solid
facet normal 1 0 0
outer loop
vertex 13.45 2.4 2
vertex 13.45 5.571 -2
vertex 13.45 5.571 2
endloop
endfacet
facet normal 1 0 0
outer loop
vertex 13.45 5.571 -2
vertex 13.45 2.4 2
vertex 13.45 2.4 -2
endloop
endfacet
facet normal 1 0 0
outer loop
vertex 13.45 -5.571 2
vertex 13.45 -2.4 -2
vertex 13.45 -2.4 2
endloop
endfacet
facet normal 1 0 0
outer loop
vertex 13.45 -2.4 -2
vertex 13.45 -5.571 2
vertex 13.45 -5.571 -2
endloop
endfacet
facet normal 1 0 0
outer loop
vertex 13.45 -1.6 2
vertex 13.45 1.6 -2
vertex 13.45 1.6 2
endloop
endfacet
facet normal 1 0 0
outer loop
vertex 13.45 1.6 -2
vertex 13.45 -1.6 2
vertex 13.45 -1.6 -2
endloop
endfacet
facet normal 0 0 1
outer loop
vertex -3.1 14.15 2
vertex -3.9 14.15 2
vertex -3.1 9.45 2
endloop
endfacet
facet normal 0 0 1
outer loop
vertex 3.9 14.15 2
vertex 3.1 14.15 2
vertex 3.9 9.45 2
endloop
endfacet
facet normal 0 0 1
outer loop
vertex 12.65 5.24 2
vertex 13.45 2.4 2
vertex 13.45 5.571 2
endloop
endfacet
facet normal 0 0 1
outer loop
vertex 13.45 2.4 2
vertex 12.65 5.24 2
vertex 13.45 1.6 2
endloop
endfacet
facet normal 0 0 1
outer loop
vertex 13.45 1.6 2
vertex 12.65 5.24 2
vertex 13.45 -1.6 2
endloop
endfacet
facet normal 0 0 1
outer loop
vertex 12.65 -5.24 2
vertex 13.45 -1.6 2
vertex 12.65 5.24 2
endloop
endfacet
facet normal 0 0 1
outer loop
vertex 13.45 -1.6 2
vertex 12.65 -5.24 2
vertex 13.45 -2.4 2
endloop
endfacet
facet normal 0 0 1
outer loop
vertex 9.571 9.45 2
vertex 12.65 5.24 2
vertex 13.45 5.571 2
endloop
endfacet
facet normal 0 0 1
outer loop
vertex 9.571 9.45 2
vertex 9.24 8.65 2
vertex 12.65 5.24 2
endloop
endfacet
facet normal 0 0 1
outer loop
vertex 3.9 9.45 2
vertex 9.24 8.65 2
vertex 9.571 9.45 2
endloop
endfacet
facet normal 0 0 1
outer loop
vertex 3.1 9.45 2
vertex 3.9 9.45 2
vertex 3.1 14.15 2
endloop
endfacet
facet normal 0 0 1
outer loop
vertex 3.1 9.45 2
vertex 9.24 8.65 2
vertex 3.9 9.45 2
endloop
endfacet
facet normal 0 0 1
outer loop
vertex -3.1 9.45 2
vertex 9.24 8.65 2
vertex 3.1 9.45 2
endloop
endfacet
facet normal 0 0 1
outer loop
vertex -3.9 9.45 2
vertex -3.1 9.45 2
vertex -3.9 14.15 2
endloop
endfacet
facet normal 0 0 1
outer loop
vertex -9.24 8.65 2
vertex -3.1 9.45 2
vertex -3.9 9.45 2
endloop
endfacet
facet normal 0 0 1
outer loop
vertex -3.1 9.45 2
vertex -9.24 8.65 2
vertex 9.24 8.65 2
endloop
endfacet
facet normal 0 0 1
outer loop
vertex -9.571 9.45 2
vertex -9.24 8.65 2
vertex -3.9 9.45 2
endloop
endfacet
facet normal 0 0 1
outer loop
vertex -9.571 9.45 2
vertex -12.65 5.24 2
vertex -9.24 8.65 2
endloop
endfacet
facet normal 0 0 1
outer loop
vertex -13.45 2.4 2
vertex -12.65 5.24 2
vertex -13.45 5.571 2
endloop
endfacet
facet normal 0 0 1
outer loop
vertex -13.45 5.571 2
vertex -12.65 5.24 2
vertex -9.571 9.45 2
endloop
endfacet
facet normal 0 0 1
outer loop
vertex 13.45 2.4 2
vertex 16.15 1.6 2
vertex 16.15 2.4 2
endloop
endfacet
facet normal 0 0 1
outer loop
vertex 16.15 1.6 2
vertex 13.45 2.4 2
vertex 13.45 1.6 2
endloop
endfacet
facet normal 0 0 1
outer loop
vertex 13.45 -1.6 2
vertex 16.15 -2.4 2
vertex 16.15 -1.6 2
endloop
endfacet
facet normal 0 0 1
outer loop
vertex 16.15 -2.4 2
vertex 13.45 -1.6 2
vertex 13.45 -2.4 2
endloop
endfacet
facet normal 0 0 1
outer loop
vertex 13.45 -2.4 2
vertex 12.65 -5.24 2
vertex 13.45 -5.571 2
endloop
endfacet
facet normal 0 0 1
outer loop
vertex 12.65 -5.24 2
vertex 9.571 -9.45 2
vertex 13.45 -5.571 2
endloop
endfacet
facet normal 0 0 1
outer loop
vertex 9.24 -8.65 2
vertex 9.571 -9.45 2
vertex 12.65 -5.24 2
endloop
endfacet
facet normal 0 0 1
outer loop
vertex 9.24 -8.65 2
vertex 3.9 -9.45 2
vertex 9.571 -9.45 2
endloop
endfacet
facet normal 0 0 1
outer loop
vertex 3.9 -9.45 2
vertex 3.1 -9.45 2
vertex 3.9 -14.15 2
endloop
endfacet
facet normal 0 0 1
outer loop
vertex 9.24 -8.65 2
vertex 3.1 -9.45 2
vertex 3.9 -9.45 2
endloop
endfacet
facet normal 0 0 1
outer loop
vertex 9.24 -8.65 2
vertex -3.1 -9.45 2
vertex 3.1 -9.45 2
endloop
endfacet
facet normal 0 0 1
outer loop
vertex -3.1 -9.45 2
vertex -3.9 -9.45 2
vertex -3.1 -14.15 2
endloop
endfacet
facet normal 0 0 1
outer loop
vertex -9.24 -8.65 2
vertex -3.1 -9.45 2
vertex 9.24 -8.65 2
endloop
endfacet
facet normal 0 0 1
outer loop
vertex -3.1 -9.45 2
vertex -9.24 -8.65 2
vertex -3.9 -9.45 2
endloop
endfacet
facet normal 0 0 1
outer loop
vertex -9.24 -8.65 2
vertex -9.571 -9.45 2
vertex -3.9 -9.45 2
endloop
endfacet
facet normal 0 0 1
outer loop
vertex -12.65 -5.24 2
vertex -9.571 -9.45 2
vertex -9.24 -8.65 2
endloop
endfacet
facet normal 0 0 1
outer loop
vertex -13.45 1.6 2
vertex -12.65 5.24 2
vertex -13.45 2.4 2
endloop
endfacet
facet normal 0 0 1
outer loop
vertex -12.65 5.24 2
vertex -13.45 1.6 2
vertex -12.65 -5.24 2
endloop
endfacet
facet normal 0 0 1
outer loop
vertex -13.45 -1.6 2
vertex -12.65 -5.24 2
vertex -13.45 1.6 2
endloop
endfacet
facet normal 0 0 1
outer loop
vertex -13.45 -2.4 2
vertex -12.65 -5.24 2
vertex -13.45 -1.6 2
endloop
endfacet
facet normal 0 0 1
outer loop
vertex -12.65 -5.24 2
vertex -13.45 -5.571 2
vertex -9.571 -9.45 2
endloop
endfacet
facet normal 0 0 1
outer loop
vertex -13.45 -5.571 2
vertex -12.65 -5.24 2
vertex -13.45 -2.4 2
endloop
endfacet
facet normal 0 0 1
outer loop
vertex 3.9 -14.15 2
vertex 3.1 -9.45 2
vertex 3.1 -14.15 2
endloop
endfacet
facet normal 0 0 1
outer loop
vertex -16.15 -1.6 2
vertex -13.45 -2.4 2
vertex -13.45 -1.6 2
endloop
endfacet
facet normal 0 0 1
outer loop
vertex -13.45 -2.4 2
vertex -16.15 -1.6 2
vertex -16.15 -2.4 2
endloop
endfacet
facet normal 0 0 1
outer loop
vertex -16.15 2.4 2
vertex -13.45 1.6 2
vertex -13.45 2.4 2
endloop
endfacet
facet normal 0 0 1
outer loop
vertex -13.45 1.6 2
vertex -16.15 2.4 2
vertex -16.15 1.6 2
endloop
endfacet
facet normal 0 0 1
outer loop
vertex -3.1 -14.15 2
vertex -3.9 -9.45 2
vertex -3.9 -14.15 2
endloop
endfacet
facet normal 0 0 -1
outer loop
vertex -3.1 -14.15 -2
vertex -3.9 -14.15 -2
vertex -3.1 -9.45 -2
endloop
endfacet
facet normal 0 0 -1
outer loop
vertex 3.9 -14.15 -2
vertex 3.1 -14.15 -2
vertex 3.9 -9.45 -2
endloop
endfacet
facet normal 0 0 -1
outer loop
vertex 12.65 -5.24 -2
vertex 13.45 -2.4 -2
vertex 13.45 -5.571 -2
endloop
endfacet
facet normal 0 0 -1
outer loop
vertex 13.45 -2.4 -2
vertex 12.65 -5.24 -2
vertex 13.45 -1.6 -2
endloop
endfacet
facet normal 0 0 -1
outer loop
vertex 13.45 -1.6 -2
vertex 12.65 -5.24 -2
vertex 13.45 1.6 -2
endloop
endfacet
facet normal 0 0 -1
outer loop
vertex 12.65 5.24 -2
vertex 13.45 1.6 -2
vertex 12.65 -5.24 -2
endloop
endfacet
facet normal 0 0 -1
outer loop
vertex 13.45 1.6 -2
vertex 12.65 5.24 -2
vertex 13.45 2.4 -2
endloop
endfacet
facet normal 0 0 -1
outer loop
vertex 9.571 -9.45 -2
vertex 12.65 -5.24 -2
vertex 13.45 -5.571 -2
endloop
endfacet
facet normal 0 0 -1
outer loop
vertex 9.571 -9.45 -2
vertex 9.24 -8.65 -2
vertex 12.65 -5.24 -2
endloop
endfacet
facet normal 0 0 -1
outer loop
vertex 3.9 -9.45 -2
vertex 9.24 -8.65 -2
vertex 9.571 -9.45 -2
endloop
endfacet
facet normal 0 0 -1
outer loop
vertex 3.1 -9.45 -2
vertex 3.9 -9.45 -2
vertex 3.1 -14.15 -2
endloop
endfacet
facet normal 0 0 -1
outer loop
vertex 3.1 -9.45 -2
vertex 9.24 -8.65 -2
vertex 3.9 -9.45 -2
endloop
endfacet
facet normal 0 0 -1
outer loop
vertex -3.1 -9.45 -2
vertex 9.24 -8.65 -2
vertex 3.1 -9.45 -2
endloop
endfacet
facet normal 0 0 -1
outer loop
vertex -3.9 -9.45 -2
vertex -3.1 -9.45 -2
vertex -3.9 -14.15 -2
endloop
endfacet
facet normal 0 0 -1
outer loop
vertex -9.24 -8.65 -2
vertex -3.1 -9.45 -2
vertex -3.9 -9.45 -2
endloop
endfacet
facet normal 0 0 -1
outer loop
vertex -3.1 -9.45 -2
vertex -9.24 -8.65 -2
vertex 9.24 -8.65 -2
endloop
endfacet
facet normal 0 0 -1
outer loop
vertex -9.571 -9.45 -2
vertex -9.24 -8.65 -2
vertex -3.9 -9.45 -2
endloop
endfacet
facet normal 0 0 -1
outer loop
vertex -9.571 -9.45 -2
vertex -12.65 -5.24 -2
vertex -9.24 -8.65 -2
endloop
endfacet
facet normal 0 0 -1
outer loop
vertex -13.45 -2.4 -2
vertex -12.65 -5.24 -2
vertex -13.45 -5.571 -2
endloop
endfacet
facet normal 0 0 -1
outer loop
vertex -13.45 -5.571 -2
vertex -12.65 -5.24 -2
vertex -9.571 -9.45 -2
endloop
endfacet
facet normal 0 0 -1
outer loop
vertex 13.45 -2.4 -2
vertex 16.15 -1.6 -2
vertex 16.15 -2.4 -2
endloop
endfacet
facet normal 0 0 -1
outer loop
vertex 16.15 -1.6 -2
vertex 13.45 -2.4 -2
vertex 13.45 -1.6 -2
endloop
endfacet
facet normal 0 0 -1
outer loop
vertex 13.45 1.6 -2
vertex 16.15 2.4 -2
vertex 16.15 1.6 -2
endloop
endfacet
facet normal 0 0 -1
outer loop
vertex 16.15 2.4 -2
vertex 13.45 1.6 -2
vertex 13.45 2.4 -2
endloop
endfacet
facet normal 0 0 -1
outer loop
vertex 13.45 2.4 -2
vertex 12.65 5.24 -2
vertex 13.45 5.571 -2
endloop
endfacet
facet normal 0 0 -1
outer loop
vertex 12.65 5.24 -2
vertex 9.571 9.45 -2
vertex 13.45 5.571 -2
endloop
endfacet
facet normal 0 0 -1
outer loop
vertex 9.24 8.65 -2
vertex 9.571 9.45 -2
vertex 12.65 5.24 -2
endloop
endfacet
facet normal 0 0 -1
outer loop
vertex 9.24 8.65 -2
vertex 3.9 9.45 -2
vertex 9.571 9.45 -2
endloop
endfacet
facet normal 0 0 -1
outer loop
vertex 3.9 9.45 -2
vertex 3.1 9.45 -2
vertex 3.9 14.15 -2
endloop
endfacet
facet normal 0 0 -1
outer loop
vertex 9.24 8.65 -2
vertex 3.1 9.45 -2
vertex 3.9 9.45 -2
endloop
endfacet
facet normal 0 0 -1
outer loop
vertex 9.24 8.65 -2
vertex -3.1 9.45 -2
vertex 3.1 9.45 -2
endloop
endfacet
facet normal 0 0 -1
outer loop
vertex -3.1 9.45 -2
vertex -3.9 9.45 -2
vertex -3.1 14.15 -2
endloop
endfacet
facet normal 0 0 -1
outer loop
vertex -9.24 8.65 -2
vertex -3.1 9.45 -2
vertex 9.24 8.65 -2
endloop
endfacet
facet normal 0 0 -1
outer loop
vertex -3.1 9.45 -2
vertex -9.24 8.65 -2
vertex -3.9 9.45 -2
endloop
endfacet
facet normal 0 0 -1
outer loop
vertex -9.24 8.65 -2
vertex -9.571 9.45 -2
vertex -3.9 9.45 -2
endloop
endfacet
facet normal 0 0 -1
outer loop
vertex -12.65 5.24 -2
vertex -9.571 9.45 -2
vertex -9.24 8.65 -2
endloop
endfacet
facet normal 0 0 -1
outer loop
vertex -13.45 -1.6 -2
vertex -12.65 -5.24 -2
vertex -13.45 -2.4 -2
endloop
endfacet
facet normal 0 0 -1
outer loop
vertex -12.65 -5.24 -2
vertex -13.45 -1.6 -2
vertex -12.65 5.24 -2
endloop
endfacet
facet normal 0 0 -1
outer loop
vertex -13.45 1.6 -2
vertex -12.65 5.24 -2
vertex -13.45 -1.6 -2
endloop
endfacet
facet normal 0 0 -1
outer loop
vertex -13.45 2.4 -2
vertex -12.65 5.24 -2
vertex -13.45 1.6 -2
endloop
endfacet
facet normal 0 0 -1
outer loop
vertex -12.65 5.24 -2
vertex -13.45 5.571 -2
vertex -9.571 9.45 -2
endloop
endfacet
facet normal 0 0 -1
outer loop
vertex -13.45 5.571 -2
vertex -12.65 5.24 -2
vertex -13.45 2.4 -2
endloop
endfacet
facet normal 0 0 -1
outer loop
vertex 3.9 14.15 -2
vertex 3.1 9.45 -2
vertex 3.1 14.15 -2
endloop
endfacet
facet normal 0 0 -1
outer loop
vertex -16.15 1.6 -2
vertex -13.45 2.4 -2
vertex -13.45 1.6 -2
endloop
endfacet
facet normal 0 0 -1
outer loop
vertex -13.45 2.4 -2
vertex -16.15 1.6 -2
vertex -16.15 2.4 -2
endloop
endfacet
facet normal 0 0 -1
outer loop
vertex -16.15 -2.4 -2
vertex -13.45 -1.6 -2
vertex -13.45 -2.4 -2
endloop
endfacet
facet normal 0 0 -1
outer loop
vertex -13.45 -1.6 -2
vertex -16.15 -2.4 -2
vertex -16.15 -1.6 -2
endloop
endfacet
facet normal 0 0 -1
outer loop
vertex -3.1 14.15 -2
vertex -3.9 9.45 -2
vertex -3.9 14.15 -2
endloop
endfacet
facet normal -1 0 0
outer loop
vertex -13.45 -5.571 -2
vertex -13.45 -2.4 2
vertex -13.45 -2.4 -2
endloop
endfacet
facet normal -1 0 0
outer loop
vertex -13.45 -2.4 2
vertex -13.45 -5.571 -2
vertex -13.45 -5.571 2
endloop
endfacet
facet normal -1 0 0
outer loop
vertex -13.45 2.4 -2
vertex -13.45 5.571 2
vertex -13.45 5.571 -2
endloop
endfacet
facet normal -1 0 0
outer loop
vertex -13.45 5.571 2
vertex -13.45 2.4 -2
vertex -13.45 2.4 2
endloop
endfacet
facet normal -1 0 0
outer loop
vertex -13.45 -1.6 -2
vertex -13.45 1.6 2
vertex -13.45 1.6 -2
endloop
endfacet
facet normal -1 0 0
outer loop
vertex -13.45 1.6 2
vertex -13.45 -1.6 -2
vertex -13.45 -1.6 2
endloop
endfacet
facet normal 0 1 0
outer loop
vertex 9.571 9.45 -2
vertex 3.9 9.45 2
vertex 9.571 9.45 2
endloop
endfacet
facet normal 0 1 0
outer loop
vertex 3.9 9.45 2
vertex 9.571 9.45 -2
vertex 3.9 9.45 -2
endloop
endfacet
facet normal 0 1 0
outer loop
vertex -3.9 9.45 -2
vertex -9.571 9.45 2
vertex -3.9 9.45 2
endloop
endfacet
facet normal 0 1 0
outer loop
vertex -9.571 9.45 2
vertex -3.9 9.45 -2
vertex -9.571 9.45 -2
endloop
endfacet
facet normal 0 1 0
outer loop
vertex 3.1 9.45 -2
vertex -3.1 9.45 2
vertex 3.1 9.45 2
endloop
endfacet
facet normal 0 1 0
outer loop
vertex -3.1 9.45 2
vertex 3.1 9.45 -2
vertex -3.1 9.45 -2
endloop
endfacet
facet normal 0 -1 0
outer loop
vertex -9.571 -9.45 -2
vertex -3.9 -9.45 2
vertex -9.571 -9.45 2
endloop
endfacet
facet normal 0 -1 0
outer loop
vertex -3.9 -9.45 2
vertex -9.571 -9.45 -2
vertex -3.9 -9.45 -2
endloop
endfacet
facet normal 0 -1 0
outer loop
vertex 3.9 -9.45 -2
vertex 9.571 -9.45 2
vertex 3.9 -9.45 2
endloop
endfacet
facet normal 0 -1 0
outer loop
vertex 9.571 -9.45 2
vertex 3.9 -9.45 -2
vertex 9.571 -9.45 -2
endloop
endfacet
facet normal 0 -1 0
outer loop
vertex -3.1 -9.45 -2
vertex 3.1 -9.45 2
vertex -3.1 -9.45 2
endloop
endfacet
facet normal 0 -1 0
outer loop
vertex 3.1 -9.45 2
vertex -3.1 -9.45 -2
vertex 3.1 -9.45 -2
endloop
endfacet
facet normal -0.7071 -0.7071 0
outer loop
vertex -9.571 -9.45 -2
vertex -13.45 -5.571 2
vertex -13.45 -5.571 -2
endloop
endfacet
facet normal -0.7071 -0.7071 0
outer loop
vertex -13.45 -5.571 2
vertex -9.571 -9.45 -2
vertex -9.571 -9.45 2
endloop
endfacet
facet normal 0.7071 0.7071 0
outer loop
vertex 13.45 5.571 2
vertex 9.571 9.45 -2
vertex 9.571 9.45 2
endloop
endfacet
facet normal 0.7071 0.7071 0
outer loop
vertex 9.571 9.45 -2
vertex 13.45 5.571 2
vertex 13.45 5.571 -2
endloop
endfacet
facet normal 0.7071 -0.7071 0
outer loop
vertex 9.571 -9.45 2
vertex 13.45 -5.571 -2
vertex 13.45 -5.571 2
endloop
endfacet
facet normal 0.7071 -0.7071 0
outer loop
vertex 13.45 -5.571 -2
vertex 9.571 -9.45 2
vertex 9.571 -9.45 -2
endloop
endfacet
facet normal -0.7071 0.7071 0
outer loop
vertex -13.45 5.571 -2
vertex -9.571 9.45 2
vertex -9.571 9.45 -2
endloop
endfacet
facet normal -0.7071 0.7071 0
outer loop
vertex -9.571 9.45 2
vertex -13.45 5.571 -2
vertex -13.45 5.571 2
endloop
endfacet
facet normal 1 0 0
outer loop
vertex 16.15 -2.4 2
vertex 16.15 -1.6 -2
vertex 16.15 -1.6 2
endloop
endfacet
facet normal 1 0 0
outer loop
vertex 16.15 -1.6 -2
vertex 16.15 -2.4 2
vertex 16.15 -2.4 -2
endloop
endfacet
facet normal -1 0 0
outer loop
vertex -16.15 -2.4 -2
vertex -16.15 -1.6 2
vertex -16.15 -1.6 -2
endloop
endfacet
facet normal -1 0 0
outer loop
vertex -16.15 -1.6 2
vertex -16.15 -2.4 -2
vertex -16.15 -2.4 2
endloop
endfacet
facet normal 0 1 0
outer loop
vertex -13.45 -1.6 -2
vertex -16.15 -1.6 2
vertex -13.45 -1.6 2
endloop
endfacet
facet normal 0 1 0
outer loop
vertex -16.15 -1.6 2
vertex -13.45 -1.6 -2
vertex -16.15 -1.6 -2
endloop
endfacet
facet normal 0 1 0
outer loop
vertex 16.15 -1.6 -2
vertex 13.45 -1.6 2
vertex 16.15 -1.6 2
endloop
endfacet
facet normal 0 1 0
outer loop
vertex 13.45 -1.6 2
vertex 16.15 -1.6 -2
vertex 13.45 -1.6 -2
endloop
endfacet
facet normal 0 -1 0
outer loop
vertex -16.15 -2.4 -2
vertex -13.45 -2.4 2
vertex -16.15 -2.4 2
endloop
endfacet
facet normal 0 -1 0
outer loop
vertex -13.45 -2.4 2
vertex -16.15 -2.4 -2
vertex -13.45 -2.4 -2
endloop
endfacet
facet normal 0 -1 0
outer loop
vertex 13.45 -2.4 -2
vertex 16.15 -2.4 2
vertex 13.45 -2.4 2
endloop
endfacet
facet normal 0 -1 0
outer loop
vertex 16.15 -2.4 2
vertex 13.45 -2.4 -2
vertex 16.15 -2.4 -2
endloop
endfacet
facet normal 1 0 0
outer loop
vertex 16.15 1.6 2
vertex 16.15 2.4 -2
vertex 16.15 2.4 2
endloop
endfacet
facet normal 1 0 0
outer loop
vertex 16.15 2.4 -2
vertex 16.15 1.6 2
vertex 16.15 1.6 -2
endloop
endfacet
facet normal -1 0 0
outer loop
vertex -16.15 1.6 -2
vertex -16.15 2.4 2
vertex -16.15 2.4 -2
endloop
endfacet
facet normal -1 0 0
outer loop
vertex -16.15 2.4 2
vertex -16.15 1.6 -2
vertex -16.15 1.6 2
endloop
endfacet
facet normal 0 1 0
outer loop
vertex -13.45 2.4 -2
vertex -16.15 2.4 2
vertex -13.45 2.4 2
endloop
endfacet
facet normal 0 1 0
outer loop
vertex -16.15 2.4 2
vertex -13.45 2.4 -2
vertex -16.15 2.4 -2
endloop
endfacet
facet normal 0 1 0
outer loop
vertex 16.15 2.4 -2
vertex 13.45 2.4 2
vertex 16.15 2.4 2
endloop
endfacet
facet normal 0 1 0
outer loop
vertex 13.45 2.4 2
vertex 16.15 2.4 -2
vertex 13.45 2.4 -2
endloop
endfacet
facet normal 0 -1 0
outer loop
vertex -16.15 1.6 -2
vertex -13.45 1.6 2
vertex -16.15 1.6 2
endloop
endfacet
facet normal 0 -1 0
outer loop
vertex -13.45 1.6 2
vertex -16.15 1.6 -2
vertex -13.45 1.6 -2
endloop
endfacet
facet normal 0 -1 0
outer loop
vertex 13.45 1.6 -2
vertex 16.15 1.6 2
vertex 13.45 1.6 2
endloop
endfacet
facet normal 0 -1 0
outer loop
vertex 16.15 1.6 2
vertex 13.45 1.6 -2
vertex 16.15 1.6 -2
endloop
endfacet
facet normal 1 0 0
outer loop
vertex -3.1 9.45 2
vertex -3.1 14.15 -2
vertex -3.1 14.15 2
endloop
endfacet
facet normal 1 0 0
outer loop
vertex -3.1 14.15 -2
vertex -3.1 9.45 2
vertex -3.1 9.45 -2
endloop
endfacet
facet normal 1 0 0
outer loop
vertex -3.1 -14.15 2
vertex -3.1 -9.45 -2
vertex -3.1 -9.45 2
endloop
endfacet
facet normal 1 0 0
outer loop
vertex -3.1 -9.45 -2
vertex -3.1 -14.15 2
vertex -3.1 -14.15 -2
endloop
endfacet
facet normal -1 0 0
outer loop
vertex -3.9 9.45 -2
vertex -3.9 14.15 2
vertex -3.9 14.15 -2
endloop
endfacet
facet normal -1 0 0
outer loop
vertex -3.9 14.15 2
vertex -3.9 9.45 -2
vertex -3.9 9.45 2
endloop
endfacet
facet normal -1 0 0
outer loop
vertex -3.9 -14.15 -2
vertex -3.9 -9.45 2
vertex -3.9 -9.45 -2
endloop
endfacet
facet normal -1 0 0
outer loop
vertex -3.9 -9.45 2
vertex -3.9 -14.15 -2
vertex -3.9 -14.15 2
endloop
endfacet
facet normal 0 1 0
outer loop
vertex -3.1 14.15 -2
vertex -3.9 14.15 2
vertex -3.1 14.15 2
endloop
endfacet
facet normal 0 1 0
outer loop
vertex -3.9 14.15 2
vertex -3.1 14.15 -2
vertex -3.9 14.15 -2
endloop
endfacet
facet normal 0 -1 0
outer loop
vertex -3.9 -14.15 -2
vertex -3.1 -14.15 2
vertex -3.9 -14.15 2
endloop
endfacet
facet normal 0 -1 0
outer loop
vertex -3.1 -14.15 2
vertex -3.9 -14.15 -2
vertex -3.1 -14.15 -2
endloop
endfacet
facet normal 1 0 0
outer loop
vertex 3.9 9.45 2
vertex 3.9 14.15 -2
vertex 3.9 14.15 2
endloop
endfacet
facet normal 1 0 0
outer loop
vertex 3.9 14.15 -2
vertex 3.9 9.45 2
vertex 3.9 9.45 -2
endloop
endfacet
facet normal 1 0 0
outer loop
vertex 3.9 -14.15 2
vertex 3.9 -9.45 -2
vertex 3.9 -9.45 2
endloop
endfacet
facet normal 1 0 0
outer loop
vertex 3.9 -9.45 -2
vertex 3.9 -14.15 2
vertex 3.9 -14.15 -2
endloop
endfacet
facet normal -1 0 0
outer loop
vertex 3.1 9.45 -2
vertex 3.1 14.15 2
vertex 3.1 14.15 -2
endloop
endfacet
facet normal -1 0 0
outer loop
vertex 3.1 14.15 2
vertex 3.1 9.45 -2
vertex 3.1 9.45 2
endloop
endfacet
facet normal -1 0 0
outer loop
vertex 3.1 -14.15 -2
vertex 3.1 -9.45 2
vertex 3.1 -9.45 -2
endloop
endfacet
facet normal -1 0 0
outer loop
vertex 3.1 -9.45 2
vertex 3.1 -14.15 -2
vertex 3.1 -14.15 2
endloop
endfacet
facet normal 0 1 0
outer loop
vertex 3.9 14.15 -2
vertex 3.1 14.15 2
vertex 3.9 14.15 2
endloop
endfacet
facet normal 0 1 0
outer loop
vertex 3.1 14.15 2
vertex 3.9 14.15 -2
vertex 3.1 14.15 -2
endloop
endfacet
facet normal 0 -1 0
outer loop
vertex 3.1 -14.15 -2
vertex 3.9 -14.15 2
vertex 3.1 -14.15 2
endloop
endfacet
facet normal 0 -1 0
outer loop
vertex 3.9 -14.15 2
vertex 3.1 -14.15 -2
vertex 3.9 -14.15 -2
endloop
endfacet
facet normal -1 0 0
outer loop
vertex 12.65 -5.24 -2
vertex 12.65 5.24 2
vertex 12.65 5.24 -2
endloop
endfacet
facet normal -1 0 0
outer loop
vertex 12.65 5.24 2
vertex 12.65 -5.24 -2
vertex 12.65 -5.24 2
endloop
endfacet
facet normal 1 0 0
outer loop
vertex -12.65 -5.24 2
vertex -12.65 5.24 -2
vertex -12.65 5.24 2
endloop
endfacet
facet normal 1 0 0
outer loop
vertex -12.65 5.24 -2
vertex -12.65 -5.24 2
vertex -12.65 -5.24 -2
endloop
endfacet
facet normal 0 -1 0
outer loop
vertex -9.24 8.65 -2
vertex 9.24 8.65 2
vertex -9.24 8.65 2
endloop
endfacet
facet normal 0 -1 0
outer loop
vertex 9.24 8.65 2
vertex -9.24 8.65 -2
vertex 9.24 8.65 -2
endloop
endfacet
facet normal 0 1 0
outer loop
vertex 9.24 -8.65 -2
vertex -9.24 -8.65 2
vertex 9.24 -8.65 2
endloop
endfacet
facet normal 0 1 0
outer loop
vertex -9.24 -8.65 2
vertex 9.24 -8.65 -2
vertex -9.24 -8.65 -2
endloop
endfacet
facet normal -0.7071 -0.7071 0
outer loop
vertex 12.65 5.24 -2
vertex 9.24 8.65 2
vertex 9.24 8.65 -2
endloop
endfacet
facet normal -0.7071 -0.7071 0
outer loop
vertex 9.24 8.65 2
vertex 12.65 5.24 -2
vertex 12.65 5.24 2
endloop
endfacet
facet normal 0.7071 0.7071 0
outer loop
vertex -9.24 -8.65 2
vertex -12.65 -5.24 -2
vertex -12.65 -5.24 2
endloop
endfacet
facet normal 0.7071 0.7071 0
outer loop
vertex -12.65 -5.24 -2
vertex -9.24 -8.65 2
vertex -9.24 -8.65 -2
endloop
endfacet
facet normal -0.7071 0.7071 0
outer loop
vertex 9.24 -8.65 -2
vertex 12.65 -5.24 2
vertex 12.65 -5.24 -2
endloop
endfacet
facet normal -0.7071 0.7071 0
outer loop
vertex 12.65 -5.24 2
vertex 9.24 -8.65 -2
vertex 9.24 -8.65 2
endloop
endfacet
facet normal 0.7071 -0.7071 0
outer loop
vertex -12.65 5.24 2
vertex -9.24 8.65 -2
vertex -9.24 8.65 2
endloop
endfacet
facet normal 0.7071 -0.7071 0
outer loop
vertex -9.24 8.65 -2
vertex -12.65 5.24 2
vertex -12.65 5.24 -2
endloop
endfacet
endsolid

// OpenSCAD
// Length of the spacer
l = 4;

// thickness of the spacer
t = 0.8;

// horizontal supports offset
ho = 2;

// vertical supports offset
vo = 3.5;

// diagonal bevels angle
a = 45;   

// // hairpin crossection ( 4 1/8 )
// hw = 25.6;  // width
// hh = 17.6;  // height
// hd = 25.6;  // distance between the diagonal bevels

// // hairpin crossection ( 4 3/8 )
// hw = 26.3;  // width
// hh = 19.3;  // height
// hd = 26.3;  // distance between the diagonal bevels

// hairpin crossection ( Ultra v2 countervail, 4 3/8 )
hw = 25.3;  // width
hh = 17.3;  // height
hd = 25.3;  // distance between the diagonal bevels


// mold inner dimensions
mw = 32.3;  // width
mh = 28.3;  // height


module grip_body( w, h, d, l )
{
   intersection( )
   {
      cube( [ w, h, l ], true );
      rotate( [ 0, 0, a ] )
      {
         cube( [ d,   d*2, l ], true );
      }
      rotate( [ 0, 0, -a ] )
      {
         cube( [ d,   d*2, l ], true );
      }
   }
}

difference( )
{
   union( )
   {
      grip_body( hw + 2*t, hh + 2*t, hd + 2*t, l );

      translate( [ 0, -ho, 0 ] ) { cube( [ mw, t , l ], true ); }
      translate( [ 0, ho, 0 ] ) { cube( [ mw, t , l ], true ); }
      translate( [ -vo, 0, 0 ] ) { cube( [ t , mh, l ], true ); }
      translate( [ vo, 0, 0 ] ) { cube( [ t , mh, l ], true ); }
   }

   grip_body( hw, hh, hd, l );
}
   
